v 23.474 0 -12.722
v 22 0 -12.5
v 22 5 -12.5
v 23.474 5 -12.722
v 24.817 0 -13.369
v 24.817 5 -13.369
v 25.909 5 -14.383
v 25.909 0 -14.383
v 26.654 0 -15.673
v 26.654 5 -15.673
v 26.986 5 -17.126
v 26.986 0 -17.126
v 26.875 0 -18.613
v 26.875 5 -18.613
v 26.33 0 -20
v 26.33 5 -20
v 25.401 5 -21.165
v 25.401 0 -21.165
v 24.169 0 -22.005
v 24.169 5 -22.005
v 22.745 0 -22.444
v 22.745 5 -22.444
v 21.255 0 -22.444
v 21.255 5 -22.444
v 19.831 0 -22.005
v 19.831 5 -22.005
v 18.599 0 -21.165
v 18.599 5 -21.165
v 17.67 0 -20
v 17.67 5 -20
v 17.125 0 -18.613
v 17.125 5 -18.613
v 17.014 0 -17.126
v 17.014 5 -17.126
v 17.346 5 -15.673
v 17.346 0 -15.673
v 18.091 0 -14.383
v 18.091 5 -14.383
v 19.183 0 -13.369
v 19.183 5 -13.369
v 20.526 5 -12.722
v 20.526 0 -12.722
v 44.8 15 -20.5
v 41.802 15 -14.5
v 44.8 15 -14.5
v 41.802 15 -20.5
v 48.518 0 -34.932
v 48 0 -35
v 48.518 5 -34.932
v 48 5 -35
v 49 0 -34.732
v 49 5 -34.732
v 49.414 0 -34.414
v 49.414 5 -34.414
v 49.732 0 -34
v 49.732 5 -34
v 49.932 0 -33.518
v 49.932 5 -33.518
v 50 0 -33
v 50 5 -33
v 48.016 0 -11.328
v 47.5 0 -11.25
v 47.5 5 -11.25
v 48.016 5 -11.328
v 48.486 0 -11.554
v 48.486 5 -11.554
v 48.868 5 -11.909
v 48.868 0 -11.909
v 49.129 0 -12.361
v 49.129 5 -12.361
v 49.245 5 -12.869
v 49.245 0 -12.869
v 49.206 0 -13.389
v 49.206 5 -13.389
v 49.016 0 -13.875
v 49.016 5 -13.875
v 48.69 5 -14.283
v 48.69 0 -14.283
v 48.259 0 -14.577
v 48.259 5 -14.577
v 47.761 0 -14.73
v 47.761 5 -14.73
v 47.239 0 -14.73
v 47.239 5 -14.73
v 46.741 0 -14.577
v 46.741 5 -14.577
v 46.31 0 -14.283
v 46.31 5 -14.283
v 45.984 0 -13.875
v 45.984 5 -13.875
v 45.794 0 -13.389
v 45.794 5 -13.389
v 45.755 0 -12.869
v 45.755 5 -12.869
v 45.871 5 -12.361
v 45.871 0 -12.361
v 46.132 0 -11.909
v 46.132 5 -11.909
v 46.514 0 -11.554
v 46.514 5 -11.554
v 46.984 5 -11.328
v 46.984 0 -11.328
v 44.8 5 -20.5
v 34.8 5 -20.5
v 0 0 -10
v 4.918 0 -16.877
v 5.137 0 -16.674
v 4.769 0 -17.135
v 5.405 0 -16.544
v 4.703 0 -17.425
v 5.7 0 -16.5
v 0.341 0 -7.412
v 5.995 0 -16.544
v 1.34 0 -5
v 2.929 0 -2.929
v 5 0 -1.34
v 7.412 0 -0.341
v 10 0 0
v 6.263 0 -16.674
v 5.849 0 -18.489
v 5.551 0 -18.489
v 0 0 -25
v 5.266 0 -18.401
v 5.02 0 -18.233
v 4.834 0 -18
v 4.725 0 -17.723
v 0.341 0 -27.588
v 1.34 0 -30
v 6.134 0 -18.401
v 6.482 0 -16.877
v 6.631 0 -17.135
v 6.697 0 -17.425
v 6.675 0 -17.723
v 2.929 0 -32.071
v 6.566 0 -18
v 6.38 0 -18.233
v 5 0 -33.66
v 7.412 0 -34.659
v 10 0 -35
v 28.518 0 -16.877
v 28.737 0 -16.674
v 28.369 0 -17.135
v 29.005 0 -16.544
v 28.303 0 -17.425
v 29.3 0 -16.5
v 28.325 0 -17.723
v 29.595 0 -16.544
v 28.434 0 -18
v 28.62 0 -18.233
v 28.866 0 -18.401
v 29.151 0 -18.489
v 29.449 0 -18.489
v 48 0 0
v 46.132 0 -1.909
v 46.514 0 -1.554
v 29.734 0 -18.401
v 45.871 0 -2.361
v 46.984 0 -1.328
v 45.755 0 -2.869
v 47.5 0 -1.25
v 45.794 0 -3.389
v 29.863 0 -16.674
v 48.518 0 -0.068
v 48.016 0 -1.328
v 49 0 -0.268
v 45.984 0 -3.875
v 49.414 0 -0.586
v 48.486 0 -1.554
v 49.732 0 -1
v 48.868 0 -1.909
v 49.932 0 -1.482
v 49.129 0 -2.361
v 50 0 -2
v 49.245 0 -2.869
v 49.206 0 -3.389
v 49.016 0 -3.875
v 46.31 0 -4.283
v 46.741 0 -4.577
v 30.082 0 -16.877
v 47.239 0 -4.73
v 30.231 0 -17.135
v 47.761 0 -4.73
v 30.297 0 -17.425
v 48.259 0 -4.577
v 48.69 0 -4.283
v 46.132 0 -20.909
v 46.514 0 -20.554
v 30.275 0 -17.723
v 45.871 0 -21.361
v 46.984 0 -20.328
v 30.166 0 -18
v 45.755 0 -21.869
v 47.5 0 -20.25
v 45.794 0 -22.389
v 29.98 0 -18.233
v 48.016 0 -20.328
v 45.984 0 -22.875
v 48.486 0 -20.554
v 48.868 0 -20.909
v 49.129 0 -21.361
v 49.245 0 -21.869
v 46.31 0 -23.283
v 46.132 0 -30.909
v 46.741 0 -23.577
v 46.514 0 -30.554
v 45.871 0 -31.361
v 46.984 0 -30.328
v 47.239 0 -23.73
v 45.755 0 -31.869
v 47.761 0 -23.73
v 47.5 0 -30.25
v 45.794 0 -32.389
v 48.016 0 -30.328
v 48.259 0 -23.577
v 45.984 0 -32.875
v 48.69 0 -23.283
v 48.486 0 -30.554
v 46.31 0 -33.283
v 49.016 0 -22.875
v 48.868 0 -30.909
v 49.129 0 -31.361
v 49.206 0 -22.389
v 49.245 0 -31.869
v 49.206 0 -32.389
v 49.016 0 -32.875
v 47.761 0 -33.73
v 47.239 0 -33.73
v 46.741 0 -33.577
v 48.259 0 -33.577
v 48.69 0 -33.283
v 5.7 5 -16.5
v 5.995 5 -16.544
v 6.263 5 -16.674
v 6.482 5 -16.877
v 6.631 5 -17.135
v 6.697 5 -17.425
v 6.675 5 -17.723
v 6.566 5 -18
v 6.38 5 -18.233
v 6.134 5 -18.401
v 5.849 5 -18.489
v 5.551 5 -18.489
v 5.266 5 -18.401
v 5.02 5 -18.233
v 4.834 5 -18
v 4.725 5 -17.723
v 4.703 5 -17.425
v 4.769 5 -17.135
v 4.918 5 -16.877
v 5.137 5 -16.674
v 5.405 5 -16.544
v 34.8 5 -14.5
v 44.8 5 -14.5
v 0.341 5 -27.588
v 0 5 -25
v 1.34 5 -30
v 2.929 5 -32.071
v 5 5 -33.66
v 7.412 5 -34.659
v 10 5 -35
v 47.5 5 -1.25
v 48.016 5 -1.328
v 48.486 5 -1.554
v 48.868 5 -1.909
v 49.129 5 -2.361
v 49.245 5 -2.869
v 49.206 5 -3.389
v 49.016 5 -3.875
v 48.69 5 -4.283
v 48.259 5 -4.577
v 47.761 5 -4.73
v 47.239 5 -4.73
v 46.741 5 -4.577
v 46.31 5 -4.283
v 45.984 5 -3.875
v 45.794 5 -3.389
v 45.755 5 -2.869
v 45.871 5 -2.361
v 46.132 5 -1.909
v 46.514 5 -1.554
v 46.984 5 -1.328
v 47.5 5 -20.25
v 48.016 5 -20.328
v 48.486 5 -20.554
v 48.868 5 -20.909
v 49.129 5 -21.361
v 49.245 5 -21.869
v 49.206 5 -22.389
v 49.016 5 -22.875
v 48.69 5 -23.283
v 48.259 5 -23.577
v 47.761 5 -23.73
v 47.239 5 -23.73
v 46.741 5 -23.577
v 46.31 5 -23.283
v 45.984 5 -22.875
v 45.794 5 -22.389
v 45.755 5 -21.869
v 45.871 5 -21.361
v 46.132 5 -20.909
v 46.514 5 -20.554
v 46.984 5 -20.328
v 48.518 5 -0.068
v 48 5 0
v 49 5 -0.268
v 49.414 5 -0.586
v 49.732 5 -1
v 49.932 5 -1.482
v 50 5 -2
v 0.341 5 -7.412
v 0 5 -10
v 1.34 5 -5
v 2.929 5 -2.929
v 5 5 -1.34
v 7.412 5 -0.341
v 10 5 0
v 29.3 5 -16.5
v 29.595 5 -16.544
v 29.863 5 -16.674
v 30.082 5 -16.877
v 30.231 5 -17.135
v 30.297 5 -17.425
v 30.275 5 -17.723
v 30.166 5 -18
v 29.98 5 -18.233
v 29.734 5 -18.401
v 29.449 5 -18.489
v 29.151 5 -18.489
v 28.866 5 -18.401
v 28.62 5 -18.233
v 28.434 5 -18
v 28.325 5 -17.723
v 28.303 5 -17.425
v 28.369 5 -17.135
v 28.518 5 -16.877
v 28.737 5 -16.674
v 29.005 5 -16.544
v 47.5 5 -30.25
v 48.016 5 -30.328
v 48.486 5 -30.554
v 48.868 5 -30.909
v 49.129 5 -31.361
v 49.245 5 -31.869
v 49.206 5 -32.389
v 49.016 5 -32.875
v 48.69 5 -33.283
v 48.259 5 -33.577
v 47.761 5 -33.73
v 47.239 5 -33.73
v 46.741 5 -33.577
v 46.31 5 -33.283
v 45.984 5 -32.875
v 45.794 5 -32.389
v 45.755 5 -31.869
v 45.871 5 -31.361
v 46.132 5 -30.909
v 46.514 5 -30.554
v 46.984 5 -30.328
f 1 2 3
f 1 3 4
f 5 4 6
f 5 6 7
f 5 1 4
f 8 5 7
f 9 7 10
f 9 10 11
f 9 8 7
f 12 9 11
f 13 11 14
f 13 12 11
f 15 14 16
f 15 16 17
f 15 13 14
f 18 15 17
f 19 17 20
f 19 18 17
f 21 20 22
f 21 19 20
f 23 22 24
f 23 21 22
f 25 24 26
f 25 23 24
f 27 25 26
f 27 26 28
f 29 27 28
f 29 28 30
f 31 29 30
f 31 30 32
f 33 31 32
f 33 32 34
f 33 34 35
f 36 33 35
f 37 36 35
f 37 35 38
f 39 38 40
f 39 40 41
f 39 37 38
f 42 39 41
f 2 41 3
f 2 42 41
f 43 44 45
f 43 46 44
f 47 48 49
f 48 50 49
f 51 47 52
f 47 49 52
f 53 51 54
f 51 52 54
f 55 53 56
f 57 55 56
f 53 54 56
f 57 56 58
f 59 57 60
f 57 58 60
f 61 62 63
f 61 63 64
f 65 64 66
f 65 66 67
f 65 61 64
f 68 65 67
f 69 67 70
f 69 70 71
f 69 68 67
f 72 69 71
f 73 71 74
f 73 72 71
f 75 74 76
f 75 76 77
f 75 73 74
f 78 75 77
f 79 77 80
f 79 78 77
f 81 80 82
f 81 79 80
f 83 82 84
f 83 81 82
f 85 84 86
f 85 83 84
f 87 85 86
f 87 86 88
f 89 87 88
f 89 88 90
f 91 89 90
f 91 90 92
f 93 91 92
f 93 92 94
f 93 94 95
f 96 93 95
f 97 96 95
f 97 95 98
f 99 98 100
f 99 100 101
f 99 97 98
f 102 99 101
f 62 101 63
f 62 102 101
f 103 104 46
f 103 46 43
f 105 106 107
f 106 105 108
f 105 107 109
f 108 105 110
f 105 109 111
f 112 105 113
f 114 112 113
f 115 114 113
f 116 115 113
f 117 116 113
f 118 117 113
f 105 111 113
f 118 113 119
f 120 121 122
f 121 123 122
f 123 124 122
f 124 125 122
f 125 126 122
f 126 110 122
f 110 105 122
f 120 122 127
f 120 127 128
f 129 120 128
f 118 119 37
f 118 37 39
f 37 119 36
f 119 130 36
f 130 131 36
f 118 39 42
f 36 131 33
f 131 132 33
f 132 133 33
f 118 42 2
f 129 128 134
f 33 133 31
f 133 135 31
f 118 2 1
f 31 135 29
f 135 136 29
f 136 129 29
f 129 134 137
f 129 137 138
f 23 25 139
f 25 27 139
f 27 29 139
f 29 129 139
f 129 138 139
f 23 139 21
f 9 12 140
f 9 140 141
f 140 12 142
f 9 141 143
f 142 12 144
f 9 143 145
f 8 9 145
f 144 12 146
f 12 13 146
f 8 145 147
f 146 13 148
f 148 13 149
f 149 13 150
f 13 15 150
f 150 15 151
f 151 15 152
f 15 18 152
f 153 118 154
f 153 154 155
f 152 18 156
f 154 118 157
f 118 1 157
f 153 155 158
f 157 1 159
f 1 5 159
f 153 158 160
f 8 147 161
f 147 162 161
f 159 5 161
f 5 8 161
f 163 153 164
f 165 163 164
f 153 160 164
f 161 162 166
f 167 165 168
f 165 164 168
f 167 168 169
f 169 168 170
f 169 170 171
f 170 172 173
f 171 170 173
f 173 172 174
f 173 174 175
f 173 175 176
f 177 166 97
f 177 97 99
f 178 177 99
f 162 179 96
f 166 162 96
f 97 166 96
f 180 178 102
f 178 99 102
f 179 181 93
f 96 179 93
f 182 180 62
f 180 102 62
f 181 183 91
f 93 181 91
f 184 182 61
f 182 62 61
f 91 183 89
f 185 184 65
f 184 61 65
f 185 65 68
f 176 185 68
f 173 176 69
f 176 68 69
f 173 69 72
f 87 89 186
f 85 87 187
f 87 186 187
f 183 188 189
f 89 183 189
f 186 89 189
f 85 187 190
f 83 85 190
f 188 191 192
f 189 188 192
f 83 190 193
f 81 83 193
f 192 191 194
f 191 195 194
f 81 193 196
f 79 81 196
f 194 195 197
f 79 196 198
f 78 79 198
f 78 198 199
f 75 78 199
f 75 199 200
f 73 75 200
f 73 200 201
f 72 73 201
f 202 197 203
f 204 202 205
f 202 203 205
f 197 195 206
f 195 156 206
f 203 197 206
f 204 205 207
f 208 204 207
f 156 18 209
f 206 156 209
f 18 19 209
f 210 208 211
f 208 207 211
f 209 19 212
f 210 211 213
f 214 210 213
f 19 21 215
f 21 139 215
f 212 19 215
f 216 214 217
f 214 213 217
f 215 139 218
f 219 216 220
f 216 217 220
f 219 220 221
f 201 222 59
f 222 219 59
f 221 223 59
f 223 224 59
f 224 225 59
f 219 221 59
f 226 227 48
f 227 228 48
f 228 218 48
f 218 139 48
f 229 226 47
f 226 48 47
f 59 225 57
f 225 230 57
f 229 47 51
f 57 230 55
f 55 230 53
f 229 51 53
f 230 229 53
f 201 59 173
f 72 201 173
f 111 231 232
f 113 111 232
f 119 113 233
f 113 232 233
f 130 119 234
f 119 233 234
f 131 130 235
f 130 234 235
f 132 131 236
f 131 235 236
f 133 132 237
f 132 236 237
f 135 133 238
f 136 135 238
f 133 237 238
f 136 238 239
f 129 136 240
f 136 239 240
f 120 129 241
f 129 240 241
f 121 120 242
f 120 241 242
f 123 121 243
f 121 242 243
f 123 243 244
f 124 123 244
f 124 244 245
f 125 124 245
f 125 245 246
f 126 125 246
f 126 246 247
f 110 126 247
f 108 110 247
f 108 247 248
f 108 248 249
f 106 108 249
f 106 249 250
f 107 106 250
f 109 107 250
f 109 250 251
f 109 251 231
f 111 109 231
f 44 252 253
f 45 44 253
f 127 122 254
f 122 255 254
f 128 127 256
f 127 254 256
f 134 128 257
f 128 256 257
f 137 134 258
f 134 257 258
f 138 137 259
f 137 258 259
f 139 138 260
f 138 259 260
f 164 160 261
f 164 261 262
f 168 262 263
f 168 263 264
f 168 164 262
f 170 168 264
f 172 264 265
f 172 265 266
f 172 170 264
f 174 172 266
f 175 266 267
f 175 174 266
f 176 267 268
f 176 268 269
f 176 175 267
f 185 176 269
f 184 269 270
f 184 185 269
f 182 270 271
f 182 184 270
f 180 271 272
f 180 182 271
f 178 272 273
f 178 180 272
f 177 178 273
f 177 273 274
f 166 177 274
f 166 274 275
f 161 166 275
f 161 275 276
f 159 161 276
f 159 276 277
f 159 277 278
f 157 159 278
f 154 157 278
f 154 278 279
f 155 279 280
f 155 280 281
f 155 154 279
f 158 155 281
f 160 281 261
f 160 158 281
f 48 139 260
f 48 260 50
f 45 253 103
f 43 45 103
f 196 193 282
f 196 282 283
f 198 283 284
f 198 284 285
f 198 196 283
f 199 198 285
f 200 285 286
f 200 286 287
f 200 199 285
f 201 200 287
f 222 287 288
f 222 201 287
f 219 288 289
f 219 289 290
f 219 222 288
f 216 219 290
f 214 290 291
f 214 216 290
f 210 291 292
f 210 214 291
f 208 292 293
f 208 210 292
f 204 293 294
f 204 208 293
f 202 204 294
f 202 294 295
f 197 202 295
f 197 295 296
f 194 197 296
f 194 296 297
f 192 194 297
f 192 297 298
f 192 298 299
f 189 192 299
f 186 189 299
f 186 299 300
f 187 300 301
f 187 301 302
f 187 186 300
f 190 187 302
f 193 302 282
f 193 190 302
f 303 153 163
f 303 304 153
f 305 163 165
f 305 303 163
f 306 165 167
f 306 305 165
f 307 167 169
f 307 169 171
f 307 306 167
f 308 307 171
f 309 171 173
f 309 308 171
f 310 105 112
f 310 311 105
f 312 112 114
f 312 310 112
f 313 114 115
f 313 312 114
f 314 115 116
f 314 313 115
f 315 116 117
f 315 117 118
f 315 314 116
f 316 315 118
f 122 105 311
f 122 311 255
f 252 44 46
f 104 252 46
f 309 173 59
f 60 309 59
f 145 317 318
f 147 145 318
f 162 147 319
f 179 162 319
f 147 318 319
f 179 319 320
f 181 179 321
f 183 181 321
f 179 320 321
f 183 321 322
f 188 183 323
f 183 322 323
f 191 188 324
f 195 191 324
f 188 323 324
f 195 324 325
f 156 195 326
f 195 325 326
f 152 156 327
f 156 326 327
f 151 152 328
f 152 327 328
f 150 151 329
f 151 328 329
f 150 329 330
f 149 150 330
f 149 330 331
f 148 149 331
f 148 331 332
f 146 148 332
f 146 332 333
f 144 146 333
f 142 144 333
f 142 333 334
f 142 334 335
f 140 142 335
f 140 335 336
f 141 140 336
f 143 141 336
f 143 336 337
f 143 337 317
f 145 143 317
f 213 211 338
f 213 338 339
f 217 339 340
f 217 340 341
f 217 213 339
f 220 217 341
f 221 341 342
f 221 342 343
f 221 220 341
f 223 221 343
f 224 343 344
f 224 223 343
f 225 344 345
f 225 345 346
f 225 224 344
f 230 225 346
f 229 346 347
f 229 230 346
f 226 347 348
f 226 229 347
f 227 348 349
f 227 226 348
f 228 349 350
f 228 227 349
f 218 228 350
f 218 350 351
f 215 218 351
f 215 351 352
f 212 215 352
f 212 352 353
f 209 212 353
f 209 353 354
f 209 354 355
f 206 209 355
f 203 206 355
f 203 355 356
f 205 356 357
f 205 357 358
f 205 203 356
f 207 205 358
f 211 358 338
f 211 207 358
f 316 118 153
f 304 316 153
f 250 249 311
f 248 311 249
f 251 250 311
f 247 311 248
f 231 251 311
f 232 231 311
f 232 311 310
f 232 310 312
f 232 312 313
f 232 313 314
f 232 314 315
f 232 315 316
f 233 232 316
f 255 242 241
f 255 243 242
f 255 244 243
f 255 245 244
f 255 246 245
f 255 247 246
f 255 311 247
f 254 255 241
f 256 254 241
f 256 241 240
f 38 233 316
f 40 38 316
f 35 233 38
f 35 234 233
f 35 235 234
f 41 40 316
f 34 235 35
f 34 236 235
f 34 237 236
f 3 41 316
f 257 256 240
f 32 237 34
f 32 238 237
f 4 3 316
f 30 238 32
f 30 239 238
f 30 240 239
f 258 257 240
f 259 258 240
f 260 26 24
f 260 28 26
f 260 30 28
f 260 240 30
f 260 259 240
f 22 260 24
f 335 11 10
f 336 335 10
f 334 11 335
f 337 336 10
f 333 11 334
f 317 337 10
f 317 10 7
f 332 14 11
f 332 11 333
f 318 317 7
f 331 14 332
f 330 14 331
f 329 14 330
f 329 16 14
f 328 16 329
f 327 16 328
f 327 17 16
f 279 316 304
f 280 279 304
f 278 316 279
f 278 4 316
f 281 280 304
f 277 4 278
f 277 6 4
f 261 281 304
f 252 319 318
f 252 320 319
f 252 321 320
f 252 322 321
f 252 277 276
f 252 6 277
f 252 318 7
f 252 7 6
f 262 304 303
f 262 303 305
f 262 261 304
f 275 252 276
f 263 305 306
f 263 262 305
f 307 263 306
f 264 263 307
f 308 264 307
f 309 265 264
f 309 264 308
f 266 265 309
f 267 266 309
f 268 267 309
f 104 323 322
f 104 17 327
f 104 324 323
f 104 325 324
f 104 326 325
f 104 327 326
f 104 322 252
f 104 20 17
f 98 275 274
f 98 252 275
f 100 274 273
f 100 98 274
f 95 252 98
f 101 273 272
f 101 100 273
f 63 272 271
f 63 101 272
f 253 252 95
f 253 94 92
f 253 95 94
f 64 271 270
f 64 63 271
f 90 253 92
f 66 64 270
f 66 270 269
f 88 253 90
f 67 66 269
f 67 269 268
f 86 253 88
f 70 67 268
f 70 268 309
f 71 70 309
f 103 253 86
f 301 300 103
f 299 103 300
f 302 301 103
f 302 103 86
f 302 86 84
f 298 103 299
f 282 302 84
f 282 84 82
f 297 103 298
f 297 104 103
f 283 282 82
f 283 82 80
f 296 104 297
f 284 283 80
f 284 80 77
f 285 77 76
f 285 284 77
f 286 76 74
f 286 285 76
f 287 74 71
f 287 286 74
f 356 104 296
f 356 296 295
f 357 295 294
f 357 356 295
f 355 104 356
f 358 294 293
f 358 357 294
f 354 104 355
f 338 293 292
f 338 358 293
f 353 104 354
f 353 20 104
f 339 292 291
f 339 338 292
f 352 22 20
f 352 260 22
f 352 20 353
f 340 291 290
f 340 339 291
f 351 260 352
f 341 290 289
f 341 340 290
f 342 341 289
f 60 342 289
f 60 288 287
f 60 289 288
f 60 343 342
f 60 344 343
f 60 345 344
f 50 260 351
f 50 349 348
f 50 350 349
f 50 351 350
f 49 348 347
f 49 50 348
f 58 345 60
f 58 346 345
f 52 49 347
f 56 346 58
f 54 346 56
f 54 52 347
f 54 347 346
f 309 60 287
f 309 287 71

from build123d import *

# Parameters (mm, degrees)
SKETCH1_W           = 50
SKETCH1_H           = 35
SKETCH1_R           = 5
SKETCH1_R_2         = 1.75
BOSS_EXTRUDE1_DEPTH = 5
FILLET1_R           = 10
FILLET2_R           = 2
SKETCH2_W           = 10
SKETCH2_H           = 6
BOSS_EXTRUDE2_DEPTH = 10
CHAMFER1_SIZE2      = 7.002075382
CHAMFER1_SIZE       = 10
SKETCH3_R           = 1
CUT_EXTRUDE1_DEPTH  = 62.846584384


with BuildPart() as part:
    # Sketch1 → Boss-Extrude1 (new body)
    with BuildSketch(Plane(origin=(0, 0, 0), x_dir=(1, 0, 0), z_dir=(0, 1, 0))):
        with Locations((25, 17.5)):
            Rectangle(SKETCH1_W, SKETCH1_H)
        with Locations(Location((22, 17.5, 0), (0, 0, 270))):
            Circle(SKETCH1_R, mode=Mode.SUBTRACT)
        with Locations(Location((47.5, 32, 0), (0, 0, 270))):
            Circle(SKETCH1_R_2, mode=Mode.SUBTRACT)
        with Locations(Location((47.5, 22, 0), (0, 0, 270))):
            Circle(SKETCH1_R_2, mode=Mode.SUBTRACT)
        with Locations(Location((47.5, 13, 0), (0, 0, 270))):
            Circle(SKETCH1_R_2, mode=Mode.SUBTRACT)
        with Locations(Location((47.5, 3, 0), (0, 0, 270))):
            Circle(SKETCH1_R_2, mode=Mode.SUBTRACT)
    extrude(amount=BOSS_EXTRUDE1_DEPTH)

    # Fillet1
    fillet1_edges = [part.edges().sort_by_distance(p)[0] for p in [
        (0, 2.5, 0),
        (0, 2.5, -35),
    ]]
    fillet(fillet1_edges, radius=FILLET1_R)

    # Fillet2
    fillet2_edges = [part.edges().sort_by_distance(p)[0] for p in [
        (50, 2.5, -35),
        (50, 2.5, 0),
    ]]
    fillet(fillet2_edges, radius=FILLET2_R)

    # Sketch2 → Boss-Extrude2 (add)
    with BuildSketch(Plane(origin=(0, 5, 0), x_dir=(1, 0, 0), z_dir=(0, 1, 0))):
        with Locations((39.8, 17.5)):
            Rectangle(SKETCH2_W, SKETCH2_H)
    extrude(amount=BOSS_EXTRUDE2_DEPTH)

    # Chamfer1
    chamfer1_edges = [part.edges().sort_by_distance(p)[0] for p in [
        (34.8, 15, -17.5),
    ]]
    chamfer1_side = [part.faces().sort_by_distance(p)[0] for p in [
        (34.8, 14.859958492, -17.5),
    ]]
    chamfer(chamfer1_edges, length=CHAMFER1_SIZE - 0.0001, length2=CHAMFER1_SIZE2 - 0.0001, reference=chamfer1_side[0])  # a hair under: the kernel refuses the full size

    # Sketch3 → Cut-Extrude1 (cut, through all)
    with BuildSketch(Plane(origin=(0, 5, 0), x_dir=(1, 0, 0), z_dir=(0, 1, 0))):
        with Locations(Location((5.7, 17.5, 0), (0, 0, 270))):
            Circle(SKETCH3_R)
        with Locations(Location((29.3, 17.5, 0), (0, 0, 270))):
            Circle(SKETCH3_R)
    extrude(amount=-CUT_EXTRUDE1_DEPTH, mode=Mode.SUBTRACT)


solid = part.part
